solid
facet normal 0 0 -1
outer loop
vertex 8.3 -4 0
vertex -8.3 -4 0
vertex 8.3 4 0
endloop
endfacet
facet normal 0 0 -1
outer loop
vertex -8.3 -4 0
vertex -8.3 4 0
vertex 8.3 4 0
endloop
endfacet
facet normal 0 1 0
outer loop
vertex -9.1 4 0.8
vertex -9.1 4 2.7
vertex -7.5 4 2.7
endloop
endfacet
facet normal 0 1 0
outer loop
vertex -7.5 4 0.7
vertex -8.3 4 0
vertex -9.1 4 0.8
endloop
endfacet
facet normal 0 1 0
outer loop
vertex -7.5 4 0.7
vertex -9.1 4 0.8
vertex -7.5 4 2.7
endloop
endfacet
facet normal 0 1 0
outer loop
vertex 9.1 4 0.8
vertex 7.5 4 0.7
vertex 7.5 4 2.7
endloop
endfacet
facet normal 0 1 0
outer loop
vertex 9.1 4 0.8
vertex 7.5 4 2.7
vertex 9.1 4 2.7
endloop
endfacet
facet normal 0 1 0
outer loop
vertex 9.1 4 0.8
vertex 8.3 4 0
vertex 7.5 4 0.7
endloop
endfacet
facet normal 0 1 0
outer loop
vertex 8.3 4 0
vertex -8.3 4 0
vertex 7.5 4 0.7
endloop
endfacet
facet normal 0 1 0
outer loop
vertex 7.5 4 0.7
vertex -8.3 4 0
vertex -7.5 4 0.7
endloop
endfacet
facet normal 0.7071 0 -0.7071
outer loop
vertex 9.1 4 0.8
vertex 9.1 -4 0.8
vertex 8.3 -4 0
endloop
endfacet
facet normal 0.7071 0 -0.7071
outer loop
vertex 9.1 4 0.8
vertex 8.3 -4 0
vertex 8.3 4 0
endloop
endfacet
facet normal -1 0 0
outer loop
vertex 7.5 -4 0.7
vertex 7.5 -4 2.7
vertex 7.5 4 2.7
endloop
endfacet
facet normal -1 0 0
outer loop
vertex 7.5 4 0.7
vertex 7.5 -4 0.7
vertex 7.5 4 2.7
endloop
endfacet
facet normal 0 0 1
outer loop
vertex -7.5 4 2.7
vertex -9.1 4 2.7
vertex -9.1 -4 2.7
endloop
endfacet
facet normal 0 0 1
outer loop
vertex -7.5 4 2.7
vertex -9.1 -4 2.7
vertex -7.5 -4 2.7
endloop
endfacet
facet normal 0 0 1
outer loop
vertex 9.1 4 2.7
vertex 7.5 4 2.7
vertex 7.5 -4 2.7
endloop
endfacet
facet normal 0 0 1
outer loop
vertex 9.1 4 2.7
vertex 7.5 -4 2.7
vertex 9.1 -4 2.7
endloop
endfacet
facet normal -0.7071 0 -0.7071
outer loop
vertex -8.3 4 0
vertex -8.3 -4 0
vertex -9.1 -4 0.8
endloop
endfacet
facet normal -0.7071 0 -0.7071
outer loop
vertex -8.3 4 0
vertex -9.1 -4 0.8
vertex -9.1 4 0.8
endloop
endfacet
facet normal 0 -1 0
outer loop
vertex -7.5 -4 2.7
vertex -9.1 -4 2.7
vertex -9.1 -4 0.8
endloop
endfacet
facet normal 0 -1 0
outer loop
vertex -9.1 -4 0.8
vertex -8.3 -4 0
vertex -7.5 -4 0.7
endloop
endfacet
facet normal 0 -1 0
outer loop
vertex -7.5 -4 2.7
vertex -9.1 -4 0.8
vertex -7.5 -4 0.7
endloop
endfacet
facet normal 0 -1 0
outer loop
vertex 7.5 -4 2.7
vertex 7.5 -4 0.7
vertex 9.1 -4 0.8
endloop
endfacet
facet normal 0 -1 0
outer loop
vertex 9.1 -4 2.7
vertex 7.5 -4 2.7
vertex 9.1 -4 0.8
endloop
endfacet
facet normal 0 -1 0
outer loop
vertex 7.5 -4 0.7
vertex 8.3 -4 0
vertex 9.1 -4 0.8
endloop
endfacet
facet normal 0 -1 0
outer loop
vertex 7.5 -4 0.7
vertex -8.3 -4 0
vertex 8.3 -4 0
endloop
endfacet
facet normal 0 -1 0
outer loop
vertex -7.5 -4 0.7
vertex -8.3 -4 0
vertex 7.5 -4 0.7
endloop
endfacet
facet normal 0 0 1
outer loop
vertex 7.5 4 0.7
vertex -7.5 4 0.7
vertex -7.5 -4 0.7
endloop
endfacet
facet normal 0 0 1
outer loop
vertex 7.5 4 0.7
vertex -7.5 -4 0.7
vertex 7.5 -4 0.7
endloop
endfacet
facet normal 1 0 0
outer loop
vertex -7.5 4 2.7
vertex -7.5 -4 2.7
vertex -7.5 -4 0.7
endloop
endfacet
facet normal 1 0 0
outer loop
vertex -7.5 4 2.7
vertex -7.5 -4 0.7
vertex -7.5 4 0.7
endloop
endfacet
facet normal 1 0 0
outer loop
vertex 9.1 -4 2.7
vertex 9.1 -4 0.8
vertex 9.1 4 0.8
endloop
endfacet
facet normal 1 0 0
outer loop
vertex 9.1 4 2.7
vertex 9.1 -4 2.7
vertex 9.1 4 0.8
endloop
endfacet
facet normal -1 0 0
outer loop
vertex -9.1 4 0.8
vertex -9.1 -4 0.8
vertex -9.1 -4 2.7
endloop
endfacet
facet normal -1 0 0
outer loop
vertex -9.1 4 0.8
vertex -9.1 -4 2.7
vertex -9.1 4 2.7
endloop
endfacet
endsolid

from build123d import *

# Parameters (mm, degrees)
F0_W     = 18.2
F0_H     = 8
F1_DEPTH = 2.7
F2_W     = 15
F2_H     = 8
F3_DEPTH = 2
F4_SIZE  = 0.8


with BuildPart() as f1:
    # F0 (on Top) → F1 (new body)
    with BuildSketch(Plane.XY):
        Rectangle(F0_W, F0_H)
    extrude(amount=F1_DEPTH)

    # F2 (on face) → F3 (cut)
    with BuildSketch(Plane.XY.offset(2.7)):
        Rectangle(F2_W, F2_H)
    extrude(amount=-F3_DEPTH, mode=Mode.SUBTRACT)

    # F4
    f4_edges = [f1.edges().sort_by_distance(p)[0] for p in [
        (-9.1, 0, 0),
        (9.1, 0, 0),
    ]]
    chamfer(f4_edges, length=F4_SIZE)


solid = f1.part
